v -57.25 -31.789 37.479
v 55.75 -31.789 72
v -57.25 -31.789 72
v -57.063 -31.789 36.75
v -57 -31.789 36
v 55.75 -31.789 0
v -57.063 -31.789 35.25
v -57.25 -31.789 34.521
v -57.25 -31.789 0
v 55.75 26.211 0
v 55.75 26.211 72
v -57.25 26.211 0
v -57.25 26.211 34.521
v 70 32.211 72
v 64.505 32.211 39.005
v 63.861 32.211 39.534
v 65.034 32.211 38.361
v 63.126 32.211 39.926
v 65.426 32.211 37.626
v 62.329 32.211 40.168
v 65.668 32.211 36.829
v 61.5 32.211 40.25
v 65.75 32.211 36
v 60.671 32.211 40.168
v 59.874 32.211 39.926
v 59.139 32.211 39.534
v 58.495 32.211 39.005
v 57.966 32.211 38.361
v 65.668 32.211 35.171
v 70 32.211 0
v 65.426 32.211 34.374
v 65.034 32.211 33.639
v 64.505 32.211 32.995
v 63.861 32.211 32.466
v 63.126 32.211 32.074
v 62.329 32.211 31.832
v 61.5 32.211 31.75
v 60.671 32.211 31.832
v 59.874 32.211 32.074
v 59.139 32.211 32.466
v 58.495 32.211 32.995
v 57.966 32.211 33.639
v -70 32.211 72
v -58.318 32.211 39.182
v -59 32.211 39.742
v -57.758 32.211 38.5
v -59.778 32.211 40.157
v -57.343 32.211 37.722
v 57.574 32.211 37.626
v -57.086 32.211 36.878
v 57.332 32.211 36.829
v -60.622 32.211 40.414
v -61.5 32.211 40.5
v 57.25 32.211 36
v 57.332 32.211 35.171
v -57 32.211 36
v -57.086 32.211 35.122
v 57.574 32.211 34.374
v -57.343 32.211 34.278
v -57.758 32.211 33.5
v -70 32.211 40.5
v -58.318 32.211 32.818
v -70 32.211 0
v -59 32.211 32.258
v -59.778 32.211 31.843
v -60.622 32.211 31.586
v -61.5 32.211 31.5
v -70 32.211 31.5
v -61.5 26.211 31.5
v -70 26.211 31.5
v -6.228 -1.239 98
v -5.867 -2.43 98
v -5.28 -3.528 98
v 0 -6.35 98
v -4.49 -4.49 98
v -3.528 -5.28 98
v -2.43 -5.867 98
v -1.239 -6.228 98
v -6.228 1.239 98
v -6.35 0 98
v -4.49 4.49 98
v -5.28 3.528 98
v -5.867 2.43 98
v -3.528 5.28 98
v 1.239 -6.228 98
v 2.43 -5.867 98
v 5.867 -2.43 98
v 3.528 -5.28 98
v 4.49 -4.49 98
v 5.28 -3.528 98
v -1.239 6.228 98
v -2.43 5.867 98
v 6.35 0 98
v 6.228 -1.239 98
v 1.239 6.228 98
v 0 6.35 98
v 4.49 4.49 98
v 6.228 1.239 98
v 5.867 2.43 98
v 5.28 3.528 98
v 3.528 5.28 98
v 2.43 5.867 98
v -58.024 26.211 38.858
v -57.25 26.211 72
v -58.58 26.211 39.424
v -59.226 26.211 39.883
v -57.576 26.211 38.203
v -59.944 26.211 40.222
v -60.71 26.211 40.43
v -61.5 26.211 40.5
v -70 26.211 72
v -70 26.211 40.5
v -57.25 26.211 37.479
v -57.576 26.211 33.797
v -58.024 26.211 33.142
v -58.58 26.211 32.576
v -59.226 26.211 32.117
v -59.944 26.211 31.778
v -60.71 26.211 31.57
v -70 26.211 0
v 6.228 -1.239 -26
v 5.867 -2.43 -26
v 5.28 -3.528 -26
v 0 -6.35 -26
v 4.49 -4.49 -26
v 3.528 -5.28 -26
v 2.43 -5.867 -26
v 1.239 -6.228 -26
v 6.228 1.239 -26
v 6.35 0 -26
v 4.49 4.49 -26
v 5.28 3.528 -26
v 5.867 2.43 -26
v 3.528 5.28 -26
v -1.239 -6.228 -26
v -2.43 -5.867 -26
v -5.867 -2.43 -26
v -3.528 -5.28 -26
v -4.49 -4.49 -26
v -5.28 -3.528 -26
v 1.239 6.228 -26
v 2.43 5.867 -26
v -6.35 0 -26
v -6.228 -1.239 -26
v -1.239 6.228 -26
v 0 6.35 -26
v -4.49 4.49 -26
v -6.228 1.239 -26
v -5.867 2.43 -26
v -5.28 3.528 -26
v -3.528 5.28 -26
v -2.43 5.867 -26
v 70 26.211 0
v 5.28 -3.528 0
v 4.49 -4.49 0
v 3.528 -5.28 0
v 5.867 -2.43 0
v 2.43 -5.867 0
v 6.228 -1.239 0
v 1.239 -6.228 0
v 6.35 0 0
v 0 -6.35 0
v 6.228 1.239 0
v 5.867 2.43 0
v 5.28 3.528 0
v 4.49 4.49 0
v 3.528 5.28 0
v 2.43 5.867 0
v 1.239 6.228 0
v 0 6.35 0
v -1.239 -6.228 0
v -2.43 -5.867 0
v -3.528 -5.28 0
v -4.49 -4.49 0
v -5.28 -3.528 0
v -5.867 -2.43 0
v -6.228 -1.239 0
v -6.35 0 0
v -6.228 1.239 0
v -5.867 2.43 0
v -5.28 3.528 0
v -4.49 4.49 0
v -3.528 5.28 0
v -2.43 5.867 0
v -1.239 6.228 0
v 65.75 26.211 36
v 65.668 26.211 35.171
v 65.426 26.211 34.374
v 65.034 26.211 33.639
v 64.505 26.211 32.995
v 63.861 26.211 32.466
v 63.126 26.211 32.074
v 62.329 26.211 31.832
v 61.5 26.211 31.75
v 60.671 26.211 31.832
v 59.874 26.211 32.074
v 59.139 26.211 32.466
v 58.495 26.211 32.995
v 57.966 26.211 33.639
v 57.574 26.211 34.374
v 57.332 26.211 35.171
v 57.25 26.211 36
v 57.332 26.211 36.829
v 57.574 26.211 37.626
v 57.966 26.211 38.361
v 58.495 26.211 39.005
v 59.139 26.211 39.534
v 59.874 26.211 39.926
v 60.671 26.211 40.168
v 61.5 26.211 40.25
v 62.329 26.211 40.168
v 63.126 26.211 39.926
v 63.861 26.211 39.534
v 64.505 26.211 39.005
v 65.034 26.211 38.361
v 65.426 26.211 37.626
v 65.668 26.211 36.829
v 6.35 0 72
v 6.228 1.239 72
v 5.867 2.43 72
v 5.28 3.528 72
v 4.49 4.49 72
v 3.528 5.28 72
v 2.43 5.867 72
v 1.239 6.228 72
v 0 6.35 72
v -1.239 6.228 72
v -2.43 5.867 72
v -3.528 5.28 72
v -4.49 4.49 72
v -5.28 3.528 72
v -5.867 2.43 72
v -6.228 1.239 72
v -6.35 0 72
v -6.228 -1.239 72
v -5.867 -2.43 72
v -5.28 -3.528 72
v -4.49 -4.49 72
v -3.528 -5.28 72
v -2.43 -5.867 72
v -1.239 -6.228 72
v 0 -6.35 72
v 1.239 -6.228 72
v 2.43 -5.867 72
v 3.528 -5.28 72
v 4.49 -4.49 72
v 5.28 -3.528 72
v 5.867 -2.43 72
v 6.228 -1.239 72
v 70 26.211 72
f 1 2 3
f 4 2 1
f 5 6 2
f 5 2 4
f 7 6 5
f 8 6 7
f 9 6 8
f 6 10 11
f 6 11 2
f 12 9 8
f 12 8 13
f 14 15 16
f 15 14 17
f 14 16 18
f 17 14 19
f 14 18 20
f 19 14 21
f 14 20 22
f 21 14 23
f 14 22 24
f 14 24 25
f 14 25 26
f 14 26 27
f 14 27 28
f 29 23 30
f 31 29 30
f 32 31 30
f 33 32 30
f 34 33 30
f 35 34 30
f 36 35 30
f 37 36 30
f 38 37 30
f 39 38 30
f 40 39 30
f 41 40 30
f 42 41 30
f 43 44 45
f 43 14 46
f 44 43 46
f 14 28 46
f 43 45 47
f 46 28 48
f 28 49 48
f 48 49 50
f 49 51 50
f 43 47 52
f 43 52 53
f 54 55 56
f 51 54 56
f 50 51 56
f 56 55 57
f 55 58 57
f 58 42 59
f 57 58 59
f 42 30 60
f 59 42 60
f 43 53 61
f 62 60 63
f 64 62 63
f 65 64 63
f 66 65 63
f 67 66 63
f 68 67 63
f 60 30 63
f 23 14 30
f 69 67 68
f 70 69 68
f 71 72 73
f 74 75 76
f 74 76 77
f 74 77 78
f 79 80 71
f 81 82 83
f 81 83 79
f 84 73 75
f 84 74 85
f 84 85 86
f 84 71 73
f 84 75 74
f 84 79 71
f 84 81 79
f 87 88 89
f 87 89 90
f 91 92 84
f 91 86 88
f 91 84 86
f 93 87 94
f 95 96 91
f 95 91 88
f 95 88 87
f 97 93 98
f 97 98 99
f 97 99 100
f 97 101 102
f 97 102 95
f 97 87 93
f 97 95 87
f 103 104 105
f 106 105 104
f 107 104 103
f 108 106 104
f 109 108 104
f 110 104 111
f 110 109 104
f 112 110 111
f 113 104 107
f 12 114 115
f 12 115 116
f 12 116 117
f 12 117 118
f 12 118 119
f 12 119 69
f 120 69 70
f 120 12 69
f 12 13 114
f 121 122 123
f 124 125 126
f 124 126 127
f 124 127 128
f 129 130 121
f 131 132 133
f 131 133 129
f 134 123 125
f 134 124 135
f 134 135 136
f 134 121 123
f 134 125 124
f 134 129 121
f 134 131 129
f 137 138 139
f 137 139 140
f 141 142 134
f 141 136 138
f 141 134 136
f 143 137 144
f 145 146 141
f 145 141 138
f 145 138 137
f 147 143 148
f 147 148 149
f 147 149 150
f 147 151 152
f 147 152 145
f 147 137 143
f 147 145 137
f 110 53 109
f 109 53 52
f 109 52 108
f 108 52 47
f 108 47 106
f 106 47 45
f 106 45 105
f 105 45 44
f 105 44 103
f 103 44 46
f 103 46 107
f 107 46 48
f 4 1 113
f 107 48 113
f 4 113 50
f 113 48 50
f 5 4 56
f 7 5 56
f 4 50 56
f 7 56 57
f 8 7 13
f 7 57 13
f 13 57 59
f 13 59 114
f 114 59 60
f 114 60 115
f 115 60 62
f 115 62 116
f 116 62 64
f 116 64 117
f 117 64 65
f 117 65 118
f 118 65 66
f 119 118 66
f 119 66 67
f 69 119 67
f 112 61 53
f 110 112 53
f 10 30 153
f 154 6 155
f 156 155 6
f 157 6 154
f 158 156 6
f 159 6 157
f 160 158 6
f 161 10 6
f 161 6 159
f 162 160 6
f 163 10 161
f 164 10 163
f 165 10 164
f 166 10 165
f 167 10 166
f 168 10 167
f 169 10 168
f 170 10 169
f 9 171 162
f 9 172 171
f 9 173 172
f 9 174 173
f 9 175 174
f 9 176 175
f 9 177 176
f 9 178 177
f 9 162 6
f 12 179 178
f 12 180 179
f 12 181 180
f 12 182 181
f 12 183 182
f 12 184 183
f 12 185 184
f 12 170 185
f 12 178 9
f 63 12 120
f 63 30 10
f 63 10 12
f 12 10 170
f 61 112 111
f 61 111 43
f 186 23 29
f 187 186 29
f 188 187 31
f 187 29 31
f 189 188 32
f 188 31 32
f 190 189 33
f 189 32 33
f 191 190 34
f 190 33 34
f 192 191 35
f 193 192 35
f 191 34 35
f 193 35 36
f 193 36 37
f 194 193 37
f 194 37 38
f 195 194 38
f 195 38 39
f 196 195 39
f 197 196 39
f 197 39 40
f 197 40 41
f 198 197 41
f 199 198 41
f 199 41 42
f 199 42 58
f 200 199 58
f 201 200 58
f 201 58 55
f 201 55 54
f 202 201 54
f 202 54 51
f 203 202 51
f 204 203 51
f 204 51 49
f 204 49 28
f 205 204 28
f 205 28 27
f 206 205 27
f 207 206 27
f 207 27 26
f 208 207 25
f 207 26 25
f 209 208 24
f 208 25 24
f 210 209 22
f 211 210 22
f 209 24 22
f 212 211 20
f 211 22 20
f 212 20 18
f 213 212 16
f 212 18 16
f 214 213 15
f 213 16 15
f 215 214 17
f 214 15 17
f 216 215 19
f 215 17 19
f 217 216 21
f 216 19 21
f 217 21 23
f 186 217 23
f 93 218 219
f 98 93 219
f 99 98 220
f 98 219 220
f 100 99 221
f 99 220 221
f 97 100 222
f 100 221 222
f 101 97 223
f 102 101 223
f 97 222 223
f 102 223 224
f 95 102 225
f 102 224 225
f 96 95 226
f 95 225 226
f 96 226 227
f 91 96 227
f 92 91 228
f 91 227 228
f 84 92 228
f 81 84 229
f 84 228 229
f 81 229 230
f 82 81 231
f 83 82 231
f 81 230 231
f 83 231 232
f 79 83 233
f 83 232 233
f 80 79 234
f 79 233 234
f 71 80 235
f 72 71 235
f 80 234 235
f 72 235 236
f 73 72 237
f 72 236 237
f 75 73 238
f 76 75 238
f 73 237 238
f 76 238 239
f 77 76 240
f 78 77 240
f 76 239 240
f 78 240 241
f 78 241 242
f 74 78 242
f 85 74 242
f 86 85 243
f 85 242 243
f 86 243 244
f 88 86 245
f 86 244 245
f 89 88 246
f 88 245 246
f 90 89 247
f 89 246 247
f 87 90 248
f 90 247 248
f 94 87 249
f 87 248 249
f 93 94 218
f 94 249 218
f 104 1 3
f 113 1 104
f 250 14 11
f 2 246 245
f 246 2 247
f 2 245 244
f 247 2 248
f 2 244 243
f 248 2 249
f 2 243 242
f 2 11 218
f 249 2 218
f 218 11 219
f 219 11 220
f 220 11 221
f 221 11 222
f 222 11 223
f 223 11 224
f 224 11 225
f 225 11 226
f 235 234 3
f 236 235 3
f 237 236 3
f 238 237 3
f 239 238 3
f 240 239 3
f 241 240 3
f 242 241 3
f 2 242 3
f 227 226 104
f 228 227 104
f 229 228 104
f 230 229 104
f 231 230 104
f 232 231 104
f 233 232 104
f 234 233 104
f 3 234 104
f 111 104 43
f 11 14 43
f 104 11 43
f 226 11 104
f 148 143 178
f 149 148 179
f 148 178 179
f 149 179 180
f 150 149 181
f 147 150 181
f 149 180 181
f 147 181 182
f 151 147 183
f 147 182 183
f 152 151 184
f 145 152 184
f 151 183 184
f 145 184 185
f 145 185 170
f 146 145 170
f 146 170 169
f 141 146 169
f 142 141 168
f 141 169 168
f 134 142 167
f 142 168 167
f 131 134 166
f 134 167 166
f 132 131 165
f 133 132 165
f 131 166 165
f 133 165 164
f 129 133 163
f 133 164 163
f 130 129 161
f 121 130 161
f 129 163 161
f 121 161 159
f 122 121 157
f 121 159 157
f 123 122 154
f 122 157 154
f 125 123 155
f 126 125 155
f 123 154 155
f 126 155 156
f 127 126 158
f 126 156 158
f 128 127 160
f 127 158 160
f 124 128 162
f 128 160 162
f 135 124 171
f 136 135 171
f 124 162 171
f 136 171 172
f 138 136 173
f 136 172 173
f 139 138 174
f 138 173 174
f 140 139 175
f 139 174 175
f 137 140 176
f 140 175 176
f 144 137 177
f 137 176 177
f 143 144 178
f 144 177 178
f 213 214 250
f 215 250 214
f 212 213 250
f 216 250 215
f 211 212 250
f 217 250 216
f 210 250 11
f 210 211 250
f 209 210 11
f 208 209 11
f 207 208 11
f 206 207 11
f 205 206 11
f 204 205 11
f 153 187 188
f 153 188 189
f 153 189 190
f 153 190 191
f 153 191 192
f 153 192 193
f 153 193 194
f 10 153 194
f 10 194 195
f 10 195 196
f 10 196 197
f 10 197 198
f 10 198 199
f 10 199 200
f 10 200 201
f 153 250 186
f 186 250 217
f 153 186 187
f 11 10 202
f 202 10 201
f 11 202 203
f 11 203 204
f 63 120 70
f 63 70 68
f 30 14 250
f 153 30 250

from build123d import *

# Parameters (mm, degrees)
BOSS_EXTRUDE1_DEPTH = 72
SKETCH2_R           = 4.25
CUT_EXTRUDE1_DEPTH  = 65
SKETCH3_R           = 6.35
BOSS_EXTRUDE2_DEPTH = 26
SKETCH5_R           = 6.35
BOSS_EXTRUDE3_DEPTH = 26


with BuildPart() as part:
    # Sketch1 → Boss-Extrude1 (new body)
    with BuildSketch(Plane.XY):
        Polygon((-56.490044248, 32.210989011), (58.009955752, 32.210989011), (70, 32.210989011), (70, 26.210989011), (55.75, 26.210989011), (55.75, -31.789010989), (-57.25, -31.789010989), (-57.25, 26.210989011), (-70, 26.210989011), (-70, 32.210989011), align=None)
    extrude(amount=BOSS_EXTRUDE1_DEPTH)

    # Sketch2 → Cut-Extrude1 (cut, through all)
    with BuildSketch(Plane(origin=(0, 32.210989011, 0), x_dir=(1, 0, 0), z_dir=(0, 1, 0))):
        with Locations((61.5, -36)):
            Circle(SKETCH2_R)
        with BuildLine():
            Line((-61.5, -31.5), (-70, -31.5))
            Line((-70, -31.5), (-70, -40.5))
            Line((-70, -40.5), (-61.5, -40.5))
            ThreePointArc((-61.5, -40.5), (-57, -36), (-61.5, -31.5))
        make_face()
    extrude(amount=-CUT_EXTRUDE1_DEPTH, mode=Mode.SUBTRACT)

    # Sketch3 → Boss-Extrude2 (add)
    with BuildSketch(Plane.XY.offset(72)):
        Circle(SKETCH3_R)
    extrude(amount=BOSS_EXTRUDE2_DEPTH)

    # Sketch5 → Boss-Extrude3 (add)
    with BuildSketch(Plane(origin=(0, 0, 0), x_dir=(-1, 0, 0), z_dir=(0, 0, -1))):
        Circle(SKETCH5_R)
    extrude(amount=BOSS_EXTRUDE3_DEPTH)


solid = part.part
